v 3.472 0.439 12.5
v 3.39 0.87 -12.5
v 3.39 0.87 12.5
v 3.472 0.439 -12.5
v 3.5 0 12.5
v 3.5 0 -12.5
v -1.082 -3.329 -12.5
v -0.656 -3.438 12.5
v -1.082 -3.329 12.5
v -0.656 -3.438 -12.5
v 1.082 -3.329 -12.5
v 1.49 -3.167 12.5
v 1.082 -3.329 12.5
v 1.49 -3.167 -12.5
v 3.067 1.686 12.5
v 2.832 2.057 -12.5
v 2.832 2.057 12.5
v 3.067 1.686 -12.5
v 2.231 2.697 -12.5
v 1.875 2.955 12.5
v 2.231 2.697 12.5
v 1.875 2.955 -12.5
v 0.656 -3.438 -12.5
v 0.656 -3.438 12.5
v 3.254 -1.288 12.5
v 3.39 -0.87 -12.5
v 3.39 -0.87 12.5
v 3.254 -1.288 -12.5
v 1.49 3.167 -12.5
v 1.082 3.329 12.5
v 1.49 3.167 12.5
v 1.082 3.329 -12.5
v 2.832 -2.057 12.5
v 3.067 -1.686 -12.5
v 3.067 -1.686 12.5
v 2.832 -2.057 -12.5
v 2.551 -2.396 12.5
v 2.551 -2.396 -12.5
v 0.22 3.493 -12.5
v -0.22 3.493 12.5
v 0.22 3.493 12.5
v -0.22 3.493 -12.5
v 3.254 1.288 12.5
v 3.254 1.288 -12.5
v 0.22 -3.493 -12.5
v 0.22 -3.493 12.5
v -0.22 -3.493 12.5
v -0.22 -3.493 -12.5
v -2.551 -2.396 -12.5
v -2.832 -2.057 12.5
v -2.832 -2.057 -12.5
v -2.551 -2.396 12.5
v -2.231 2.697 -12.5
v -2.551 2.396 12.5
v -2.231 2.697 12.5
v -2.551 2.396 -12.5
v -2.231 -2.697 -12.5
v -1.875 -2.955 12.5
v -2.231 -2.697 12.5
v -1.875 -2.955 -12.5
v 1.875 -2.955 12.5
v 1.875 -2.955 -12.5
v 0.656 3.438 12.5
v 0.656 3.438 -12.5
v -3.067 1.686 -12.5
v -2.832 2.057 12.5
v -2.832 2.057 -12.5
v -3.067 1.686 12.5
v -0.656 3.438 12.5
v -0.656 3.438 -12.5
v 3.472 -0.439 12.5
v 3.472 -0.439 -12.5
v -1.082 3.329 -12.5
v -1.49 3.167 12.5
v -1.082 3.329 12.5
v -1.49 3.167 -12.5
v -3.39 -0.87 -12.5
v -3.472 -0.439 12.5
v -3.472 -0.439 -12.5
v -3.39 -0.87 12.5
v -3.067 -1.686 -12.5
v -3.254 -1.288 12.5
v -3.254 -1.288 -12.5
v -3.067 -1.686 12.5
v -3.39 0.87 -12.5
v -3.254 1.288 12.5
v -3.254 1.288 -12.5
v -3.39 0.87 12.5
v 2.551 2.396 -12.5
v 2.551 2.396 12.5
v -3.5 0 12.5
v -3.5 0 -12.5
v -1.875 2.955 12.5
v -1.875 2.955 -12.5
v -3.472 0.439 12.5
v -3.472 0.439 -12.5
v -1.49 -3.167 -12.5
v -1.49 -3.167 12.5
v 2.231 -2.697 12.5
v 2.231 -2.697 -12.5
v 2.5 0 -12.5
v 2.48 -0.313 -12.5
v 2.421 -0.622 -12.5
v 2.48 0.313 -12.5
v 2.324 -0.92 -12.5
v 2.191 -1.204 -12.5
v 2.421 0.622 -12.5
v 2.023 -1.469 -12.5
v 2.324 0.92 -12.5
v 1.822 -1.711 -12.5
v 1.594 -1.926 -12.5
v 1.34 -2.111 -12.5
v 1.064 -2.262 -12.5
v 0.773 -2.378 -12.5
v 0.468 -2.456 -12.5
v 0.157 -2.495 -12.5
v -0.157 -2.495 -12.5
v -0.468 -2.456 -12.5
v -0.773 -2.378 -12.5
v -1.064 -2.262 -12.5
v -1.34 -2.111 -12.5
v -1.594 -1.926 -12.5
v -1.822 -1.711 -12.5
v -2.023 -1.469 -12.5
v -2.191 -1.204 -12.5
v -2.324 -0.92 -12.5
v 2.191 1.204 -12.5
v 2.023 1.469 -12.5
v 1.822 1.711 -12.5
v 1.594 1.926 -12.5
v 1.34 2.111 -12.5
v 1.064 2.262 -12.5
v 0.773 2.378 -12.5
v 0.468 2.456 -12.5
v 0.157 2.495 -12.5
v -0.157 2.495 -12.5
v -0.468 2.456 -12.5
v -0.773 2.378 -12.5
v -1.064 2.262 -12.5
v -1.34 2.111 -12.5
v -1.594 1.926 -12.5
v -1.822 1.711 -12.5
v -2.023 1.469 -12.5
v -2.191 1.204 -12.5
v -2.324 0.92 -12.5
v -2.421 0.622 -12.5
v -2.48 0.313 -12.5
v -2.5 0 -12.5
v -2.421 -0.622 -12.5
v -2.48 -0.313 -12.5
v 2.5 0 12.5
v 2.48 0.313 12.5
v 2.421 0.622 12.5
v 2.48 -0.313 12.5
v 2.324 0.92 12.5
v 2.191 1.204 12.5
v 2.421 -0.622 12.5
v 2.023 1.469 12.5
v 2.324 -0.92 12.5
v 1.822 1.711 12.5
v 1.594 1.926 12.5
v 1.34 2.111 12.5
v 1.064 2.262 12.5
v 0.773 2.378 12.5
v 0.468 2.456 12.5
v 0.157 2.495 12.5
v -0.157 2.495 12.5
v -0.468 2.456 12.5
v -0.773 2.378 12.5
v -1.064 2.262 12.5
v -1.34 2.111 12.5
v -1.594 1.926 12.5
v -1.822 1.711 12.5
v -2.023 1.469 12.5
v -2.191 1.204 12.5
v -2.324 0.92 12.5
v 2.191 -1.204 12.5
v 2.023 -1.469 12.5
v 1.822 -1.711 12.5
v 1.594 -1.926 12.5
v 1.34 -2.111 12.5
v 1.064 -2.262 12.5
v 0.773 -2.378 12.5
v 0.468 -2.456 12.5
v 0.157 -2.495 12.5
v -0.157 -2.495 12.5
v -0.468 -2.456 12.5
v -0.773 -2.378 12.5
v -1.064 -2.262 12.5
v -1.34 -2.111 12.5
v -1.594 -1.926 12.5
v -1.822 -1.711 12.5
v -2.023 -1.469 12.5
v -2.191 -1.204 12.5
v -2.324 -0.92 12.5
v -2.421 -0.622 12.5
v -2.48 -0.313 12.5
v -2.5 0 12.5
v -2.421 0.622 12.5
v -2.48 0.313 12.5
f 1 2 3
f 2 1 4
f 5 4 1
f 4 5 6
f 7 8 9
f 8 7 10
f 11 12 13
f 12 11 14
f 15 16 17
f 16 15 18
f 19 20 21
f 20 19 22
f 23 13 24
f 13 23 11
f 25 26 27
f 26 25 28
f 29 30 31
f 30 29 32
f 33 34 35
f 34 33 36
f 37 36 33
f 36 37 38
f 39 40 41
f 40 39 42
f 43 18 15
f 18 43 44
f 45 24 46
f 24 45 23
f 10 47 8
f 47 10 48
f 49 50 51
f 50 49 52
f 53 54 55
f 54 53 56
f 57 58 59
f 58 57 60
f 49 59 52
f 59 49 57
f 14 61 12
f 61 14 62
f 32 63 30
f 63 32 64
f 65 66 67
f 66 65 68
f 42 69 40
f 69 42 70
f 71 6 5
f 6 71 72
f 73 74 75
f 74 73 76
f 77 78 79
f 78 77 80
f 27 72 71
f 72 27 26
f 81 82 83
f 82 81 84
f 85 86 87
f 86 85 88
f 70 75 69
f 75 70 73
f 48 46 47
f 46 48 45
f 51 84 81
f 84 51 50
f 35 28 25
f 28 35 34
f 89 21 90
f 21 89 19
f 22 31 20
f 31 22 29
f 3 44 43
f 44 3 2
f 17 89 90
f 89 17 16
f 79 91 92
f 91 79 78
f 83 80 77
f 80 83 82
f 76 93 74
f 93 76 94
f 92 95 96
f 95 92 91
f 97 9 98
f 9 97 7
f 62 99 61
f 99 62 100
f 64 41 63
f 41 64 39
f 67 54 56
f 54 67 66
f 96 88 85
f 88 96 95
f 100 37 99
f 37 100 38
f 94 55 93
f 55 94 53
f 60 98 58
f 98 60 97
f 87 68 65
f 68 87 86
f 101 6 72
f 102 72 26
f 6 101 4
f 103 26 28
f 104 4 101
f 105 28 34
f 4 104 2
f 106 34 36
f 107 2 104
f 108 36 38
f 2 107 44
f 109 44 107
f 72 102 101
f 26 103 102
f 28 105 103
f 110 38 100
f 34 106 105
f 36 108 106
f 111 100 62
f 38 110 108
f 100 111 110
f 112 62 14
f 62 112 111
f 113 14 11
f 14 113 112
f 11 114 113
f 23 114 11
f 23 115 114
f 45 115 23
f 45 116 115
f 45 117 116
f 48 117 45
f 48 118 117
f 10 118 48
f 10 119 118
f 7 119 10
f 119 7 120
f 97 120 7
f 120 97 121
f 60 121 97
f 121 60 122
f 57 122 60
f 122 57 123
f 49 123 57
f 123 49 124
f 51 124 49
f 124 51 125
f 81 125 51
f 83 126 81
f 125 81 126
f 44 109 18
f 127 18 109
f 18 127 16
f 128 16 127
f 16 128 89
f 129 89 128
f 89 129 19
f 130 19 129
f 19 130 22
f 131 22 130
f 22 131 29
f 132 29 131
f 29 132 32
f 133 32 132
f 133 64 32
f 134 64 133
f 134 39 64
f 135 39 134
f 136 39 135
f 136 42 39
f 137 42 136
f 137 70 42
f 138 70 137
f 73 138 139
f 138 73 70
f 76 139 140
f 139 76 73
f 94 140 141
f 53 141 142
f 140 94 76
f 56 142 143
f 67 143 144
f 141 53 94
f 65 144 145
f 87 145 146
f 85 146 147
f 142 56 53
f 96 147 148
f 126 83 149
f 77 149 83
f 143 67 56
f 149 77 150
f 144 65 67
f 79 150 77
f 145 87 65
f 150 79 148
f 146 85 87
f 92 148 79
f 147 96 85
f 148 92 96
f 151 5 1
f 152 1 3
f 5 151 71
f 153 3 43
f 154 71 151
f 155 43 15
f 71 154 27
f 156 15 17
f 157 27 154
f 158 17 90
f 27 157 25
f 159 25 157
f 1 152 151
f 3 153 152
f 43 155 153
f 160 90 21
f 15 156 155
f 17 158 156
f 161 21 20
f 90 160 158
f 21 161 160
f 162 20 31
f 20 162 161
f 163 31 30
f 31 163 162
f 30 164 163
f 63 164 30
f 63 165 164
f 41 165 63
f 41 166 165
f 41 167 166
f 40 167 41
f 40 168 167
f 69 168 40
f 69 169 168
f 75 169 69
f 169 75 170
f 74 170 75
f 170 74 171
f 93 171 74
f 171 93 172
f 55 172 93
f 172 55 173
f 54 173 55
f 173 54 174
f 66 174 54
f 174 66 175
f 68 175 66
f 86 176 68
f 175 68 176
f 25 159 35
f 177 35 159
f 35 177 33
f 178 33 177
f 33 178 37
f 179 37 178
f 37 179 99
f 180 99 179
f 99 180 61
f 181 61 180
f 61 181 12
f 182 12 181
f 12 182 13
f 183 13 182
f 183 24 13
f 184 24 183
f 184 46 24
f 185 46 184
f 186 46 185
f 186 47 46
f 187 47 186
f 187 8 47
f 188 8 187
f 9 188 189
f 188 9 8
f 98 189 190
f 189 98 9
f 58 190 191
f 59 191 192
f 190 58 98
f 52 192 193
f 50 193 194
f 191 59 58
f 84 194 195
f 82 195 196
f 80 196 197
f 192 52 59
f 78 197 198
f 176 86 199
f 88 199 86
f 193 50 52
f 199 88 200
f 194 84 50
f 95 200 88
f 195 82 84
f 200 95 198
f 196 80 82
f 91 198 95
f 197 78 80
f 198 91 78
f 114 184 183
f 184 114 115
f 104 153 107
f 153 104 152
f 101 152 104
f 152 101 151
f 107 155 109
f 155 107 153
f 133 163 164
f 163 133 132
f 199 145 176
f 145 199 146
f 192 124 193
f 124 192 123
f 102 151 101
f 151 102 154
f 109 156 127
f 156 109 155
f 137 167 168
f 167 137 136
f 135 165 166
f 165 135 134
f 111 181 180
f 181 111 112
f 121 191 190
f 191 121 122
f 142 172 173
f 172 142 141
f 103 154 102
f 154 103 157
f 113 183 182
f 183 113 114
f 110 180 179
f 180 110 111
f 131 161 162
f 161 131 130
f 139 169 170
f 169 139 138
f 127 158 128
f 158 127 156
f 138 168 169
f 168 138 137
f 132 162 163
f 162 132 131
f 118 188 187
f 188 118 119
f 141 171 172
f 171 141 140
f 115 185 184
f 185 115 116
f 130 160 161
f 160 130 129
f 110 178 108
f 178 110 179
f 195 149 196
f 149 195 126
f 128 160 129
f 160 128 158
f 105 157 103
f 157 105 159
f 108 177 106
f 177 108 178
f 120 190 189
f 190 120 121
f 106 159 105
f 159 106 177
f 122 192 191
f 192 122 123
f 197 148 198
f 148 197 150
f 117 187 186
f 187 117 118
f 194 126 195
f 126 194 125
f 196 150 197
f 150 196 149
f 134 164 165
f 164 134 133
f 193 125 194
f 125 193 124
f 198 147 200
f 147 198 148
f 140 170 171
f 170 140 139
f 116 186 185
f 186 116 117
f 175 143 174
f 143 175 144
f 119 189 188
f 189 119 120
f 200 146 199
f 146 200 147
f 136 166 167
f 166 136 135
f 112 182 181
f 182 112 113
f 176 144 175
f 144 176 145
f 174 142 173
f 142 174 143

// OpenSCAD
$fn = 50;


difference() {
	union() {
		translate(v = [0, 0, -12.5000000000]) {
			cylinder(h = 25, r = 3.5000000000);
		}
	}
	union() {
		translate(v = [0, 0, -100.0000000000]) {
			cylinder(h = 200, r = 2.5000000000);
		}
	}
}
